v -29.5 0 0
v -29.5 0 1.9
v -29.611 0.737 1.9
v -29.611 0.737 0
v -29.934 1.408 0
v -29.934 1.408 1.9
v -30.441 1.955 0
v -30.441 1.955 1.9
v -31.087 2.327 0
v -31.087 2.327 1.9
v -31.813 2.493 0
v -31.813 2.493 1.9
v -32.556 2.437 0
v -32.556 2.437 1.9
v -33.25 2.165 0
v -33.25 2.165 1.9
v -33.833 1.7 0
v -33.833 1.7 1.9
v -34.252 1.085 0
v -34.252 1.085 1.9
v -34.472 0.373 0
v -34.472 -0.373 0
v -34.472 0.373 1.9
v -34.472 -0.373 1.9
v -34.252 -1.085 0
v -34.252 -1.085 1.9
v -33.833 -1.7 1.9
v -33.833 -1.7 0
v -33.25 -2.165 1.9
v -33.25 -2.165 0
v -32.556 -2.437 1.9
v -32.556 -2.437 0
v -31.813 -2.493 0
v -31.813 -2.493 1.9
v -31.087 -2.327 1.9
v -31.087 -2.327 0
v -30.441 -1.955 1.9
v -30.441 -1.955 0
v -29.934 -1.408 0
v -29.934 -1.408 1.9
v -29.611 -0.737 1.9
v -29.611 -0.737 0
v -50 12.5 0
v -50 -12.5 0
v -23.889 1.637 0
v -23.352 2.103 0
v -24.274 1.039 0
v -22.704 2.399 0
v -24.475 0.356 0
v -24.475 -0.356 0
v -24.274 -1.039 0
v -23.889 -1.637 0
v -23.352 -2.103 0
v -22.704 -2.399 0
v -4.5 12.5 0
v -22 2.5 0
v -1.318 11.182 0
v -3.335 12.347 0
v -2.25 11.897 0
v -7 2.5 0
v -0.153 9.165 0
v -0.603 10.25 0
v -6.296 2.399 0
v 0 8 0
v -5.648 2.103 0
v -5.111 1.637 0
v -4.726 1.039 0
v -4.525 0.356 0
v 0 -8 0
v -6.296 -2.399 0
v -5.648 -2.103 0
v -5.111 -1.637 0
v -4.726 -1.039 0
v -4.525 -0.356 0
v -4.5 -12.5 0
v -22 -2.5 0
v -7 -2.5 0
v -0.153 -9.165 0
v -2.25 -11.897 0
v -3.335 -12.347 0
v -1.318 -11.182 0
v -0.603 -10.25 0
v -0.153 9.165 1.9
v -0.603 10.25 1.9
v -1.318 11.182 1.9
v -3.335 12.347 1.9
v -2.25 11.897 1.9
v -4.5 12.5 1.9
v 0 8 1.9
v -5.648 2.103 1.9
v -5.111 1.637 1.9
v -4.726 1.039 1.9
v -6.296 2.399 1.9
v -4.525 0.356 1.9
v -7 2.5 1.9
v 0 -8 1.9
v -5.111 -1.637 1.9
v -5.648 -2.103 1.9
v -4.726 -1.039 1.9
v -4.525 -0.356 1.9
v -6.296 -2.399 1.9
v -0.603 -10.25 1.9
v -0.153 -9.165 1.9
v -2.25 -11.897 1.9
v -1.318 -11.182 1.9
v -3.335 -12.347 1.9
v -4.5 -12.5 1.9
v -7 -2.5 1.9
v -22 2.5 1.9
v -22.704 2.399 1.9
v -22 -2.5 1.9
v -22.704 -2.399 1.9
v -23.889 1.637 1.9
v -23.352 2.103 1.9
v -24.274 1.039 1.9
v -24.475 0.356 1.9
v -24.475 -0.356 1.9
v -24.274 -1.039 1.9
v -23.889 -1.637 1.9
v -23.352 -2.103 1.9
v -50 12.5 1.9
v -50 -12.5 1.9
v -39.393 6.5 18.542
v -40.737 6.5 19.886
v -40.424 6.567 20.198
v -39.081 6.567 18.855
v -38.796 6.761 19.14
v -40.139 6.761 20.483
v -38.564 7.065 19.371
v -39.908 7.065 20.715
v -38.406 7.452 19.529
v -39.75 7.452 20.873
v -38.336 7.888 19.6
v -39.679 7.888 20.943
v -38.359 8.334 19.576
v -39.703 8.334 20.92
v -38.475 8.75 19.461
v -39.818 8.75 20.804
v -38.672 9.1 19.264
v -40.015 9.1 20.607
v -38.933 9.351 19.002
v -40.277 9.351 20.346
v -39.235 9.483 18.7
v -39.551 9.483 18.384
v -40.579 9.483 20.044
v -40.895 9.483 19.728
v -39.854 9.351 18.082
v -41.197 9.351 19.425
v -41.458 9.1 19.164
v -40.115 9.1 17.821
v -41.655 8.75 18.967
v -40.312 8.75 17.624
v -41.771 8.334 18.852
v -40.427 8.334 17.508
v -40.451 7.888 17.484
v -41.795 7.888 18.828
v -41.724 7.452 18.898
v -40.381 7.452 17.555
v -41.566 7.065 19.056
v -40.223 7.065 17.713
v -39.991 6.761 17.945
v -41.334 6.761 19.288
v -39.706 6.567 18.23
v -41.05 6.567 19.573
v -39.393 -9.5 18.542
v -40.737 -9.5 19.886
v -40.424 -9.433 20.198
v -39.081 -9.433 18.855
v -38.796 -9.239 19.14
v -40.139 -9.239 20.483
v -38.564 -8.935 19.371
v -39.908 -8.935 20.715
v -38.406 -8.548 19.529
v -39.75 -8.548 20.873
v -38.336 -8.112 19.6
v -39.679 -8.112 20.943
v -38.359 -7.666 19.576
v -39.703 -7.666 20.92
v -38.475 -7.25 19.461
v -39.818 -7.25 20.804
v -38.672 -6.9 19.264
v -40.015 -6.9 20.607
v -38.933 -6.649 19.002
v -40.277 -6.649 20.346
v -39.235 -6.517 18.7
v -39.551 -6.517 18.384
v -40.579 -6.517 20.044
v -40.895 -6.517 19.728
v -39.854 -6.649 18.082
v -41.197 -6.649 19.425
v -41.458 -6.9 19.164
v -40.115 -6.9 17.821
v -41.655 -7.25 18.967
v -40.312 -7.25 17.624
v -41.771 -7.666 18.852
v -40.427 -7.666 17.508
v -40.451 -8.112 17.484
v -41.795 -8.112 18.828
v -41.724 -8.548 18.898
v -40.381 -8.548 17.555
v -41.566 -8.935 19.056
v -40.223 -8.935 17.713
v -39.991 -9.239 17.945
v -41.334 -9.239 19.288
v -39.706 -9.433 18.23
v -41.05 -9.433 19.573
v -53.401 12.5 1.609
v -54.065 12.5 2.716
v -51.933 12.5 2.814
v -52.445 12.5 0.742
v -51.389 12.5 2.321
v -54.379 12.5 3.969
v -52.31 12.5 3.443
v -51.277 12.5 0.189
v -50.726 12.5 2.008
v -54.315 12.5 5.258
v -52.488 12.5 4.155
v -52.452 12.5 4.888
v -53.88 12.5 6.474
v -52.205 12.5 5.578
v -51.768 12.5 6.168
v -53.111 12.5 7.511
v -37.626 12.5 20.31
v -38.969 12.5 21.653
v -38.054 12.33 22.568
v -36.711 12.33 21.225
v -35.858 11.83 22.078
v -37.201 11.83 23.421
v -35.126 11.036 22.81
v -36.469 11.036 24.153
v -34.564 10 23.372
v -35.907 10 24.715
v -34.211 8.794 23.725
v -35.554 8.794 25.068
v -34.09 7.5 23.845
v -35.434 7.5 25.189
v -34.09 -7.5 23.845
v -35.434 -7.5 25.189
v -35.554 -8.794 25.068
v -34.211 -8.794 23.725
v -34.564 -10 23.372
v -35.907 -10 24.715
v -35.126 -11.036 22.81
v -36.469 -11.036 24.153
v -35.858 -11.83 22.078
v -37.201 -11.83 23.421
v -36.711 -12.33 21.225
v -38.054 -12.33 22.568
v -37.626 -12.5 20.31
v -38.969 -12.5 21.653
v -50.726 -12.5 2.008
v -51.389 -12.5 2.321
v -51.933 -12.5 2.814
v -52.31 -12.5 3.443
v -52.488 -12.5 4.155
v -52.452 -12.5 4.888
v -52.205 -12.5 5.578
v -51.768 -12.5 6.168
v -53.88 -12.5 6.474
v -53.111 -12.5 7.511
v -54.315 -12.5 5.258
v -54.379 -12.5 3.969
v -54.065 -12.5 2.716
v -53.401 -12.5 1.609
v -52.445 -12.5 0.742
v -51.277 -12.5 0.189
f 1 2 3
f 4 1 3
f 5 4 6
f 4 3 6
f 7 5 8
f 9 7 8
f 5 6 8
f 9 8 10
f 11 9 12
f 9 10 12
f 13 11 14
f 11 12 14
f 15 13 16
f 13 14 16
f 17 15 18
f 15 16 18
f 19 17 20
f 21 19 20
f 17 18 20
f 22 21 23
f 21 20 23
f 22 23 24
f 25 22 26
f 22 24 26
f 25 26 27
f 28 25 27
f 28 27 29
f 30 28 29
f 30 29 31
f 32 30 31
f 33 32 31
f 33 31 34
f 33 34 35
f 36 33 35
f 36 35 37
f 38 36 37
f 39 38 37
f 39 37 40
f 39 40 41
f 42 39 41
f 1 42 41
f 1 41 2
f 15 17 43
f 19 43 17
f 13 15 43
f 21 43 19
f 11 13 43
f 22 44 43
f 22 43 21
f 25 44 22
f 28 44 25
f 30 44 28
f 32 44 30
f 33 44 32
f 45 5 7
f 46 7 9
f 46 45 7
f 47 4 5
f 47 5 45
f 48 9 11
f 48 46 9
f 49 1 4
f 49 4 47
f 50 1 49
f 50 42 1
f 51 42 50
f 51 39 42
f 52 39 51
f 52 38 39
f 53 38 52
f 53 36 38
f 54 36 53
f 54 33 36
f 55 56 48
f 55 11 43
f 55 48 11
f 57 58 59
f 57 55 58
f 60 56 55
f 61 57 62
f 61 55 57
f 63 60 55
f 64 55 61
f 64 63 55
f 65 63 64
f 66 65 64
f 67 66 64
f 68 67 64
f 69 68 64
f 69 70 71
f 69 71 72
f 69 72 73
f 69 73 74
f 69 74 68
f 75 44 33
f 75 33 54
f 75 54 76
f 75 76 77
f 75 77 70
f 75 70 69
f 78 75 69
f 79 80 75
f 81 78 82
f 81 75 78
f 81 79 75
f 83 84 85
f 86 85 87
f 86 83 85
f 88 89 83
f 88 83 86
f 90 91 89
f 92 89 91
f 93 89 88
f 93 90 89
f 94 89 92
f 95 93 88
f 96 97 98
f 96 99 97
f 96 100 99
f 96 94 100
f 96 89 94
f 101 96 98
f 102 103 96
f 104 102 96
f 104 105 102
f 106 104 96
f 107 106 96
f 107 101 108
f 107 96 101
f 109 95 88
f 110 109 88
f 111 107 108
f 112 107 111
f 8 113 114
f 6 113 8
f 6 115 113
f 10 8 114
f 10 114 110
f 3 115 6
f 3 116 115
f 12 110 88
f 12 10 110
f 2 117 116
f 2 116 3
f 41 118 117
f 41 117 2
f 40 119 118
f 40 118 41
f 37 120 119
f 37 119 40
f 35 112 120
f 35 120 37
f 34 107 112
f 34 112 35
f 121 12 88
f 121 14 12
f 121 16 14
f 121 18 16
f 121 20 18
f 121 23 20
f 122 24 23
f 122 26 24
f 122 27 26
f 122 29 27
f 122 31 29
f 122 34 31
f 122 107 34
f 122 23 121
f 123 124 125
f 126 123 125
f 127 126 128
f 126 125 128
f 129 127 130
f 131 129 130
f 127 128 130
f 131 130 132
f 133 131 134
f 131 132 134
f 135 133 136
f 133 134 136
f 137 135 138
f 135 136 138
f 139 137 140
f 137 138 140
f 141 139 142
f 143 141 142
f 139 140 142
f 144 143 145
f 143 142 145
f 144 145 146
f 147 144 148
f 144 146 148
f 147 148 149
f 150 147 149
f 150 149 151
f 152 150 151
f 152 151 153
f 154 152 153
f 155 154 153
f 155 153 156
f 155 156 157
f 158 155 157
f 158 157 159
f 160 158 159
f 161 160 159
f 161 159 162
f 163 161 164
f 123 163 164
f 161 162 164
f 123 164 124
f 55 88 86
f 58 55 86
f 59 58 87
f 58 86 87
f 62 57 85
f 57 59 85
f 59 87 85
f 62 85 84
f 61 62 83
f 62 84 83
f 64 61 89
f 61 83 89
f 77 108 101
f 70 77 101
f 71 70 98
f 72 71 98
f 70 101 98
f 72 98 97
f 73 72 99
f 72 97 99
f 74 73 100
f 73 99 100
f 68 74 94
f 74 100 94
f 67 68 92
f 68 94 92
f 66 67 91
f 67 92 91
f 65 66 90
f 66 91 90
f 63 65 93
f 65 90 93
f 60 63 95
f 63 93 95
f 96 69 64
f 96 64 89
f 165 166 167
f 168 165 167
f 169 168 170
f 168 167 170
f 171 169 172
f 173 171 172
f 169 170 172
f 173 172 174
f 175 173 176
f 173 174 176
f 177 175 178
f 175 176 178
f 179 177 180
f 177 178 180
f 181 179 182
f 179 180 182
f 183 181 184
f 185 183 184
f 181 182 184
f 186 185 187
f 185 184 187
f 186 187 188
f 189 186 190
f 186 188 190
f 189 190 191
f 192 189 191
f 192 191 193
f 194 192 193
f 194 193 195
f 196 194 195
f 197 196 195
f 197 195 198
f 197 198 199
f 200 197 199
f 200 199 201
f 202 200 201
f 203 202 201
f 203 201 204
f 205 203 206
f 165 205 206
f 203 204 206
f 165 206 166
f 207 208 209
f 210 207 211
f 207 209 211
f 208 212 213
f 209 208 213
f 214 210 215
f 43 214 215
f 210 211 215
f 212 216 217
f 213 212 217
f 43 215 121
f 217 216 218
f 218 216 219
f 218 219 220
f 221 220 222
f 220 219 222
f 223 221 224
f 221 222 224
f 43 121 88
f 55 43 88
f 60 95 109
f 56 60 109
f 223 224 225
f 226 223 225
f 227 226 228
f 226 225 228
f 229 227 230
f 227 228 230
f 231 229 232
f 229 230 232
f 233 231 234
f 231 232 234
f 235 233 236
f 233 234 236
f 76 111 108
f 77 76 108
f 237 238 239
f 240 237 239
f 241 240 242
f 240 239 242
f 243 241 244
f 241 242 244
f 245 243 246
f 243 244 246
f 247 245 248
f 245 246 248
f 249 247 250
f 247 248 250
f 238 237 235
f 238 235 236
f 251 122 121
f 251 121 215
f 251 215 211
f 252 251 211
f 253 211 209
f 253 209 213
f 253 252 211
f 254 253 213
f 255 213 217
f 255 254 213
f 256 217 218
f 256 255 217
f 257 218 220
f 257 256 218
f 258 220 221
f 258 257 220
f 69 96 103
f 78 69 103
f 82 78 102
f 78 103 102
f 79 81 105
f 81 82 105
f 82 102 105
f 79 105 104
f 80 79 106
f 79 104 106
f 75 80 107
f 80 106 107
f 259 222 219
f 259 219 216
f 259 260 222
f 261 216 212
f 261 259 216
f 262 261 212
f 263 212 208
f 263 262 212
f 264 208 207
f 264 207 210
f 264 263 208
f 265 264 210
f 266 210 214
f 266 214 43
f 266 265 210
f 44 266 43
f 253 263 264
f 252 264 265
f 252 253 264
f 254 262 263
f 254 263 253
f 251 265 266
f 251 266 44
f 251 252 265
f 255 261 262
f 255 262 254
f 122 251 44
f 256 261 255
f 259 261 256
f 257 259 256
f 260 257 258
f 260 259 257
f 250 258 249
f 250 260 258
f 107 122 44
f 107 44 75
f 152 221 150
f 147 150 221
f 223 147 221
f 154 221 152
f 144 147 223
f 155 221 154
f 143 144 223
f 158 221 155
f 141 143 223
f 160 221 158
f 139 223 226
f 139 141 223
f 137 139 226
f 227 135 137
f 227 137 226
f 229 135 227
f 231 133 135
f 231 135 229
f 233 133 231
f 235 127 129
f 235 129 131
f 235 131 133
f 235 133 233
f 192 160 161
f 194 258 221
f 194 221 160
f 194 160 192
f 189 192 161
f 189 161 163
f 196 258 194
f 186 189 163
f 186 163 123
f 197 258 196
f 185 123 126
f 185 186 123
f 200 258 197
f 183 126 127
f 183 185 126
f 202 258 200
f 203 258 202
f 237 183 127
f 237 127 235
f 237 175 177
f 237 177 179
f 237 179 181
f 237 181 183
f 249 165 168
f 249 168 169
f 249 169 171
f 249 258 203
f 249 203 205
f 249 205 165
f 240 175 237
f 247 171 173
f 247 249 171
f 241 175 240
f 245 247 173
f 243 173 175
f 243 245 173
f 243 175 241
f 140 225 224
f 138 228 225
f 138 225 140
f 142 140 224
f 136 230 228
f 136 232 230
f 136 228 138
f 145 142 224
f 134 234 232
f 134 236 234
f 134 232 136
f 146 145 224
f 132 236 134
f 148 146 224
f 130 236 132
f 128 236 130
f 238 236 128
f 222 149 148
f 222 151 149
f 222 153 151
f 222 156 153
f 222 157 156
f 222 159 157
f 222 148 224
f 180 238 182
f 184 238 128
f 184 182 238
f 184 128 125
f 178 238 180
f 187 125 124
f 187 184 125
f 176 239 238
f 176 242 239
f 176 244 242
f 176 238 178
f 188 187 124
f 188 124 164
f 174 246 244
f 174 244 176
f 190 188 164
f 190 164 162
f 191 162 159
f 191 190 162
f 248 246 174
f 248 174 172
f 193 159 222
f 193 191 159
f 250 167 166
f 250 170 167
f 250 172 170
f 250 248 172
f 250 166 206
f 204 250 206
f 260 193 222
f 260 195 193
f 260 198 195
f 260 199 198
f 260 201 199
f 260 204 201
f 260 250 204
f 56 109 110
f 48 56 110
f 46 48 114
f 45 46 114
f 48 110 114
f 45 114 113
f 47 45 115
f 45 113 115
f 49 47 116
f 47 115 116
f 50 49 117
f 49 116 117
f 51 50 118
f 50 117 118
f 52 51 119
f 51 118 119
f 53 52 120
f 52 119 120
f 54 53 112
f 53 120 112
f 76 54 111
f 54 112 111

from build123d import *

# Parameters (mm, degrees)
F1_DEPTH = 12.5
F2_R     = 2.5
F3_DEPTH = 1.9009989591
F4_R     = 1.5
F5_DEPTH = 1.8999989591


with BuildPart() as f1:
    # F0 (on Front) → F1 (new body, symmetric)
    with BuildSketch(Plane.XZ):
        with BuildLine():
            Line((-50, 0), (0, 0))
            Line((0, 0), (0, 1.8999989591))
            Line((0, 1.8999989591), (-50, 1.8999989591))
            ThreePointArc((-50, 1.8999989591), (-52.309699793, 3.4432910207), (-51.767767689, 6.167767689))
            Line((-51.767767689, 6.167767689), (-34.0900981594, 23.8454372187))
            Line((-34.0900981594, 23.8454372187), (-35.4336003076, 25.1889393669))
            Line((-35.4336003076, 25.1889393669), (-53.1112698372, 7.5112698372))
            ThreePointArc((-53.1112698372, 7.5112698372), (-54.065069943, 2.7161928976), (-50, 0))
        make_face()
    extrude(amount=F1_DEPTH, both=True)

    # F2 (on face) → F3 (cut, through all)
    with BuildSketch(Plane.XY.offset(1.8999989591)):
        with Locations((-32, 0)):
            Circle(F2_R)
        with BuildLine():
            Line((0, 12.5), (-4.5, 12.5))
            ThreePointArc((-4.5, 12.5), (-1.3180194847, 11.1819805153), (0, 8))
            Line((0, 8), (0, 12.5))
        make_face()
        with BuildLine():
            Line((0, -12.5), (0, -8))
            ThreePointArc((0, -8), (-1.3180194847, -11.1819805153), (-4.5, -12.5))
            Line((-4.5, -12.5), (0, -12.5))
        make_face()
        with BuildLine():
            Line((-7, 2.5), (-22, 2.5))
            ThreePointArc((-22, 2.5), (-24.5, 0), (-22, -2.5))
            Line((-22, -2.5), (-7, -2.5))
            ThreePointArc((-7, -2.5), (-4.5, 0), (-7, 2.5))
        make_face()
    extrude(amount=-F3_DEPTH, mode=Mode.SUBTRACT)

    # F4 (on face) → F5 (cut, through all)
    with BuildSketch(Plane(origin=(-30.3112698372, 0, 30.3112698372), x_dir=(0, -1, 0), z_dir=(-0.7071067812, 0, 0.7071067812))):
        with Locations((-8, -14.7440692221)):
            Circle(F4_R)
        with BuildLine():
            Line((-12.5, -7.2440692221), (-12.5, -12.2440692221))
            ThreePointArc((-12.5, -12.2440692221), (-11.0355339059, -8.7085353162), (-7.5, -7.2440692221))
            Line((-7.5, -7.2440692221), (-12.5, -7.2440692221))
        make_face()
        with Locations((8, -14.7440692221)):
            Circle(F4_R)
        with BuildLine():
            ThreePointArc((7.5, -7.2440692221), (11.0355339059, -8.7085353162), (12.5, -12.2440692221))
            Line((12.5, -12.2440692221), (12.5, -7.2440692221))
            Line((12.5, -7.2440692221), (7.5, -7.2440692221))
        make_face()
    extrude(amount=-F5_DEPTH, mode=Mode.SUBTRACT)


solid = f1.part
